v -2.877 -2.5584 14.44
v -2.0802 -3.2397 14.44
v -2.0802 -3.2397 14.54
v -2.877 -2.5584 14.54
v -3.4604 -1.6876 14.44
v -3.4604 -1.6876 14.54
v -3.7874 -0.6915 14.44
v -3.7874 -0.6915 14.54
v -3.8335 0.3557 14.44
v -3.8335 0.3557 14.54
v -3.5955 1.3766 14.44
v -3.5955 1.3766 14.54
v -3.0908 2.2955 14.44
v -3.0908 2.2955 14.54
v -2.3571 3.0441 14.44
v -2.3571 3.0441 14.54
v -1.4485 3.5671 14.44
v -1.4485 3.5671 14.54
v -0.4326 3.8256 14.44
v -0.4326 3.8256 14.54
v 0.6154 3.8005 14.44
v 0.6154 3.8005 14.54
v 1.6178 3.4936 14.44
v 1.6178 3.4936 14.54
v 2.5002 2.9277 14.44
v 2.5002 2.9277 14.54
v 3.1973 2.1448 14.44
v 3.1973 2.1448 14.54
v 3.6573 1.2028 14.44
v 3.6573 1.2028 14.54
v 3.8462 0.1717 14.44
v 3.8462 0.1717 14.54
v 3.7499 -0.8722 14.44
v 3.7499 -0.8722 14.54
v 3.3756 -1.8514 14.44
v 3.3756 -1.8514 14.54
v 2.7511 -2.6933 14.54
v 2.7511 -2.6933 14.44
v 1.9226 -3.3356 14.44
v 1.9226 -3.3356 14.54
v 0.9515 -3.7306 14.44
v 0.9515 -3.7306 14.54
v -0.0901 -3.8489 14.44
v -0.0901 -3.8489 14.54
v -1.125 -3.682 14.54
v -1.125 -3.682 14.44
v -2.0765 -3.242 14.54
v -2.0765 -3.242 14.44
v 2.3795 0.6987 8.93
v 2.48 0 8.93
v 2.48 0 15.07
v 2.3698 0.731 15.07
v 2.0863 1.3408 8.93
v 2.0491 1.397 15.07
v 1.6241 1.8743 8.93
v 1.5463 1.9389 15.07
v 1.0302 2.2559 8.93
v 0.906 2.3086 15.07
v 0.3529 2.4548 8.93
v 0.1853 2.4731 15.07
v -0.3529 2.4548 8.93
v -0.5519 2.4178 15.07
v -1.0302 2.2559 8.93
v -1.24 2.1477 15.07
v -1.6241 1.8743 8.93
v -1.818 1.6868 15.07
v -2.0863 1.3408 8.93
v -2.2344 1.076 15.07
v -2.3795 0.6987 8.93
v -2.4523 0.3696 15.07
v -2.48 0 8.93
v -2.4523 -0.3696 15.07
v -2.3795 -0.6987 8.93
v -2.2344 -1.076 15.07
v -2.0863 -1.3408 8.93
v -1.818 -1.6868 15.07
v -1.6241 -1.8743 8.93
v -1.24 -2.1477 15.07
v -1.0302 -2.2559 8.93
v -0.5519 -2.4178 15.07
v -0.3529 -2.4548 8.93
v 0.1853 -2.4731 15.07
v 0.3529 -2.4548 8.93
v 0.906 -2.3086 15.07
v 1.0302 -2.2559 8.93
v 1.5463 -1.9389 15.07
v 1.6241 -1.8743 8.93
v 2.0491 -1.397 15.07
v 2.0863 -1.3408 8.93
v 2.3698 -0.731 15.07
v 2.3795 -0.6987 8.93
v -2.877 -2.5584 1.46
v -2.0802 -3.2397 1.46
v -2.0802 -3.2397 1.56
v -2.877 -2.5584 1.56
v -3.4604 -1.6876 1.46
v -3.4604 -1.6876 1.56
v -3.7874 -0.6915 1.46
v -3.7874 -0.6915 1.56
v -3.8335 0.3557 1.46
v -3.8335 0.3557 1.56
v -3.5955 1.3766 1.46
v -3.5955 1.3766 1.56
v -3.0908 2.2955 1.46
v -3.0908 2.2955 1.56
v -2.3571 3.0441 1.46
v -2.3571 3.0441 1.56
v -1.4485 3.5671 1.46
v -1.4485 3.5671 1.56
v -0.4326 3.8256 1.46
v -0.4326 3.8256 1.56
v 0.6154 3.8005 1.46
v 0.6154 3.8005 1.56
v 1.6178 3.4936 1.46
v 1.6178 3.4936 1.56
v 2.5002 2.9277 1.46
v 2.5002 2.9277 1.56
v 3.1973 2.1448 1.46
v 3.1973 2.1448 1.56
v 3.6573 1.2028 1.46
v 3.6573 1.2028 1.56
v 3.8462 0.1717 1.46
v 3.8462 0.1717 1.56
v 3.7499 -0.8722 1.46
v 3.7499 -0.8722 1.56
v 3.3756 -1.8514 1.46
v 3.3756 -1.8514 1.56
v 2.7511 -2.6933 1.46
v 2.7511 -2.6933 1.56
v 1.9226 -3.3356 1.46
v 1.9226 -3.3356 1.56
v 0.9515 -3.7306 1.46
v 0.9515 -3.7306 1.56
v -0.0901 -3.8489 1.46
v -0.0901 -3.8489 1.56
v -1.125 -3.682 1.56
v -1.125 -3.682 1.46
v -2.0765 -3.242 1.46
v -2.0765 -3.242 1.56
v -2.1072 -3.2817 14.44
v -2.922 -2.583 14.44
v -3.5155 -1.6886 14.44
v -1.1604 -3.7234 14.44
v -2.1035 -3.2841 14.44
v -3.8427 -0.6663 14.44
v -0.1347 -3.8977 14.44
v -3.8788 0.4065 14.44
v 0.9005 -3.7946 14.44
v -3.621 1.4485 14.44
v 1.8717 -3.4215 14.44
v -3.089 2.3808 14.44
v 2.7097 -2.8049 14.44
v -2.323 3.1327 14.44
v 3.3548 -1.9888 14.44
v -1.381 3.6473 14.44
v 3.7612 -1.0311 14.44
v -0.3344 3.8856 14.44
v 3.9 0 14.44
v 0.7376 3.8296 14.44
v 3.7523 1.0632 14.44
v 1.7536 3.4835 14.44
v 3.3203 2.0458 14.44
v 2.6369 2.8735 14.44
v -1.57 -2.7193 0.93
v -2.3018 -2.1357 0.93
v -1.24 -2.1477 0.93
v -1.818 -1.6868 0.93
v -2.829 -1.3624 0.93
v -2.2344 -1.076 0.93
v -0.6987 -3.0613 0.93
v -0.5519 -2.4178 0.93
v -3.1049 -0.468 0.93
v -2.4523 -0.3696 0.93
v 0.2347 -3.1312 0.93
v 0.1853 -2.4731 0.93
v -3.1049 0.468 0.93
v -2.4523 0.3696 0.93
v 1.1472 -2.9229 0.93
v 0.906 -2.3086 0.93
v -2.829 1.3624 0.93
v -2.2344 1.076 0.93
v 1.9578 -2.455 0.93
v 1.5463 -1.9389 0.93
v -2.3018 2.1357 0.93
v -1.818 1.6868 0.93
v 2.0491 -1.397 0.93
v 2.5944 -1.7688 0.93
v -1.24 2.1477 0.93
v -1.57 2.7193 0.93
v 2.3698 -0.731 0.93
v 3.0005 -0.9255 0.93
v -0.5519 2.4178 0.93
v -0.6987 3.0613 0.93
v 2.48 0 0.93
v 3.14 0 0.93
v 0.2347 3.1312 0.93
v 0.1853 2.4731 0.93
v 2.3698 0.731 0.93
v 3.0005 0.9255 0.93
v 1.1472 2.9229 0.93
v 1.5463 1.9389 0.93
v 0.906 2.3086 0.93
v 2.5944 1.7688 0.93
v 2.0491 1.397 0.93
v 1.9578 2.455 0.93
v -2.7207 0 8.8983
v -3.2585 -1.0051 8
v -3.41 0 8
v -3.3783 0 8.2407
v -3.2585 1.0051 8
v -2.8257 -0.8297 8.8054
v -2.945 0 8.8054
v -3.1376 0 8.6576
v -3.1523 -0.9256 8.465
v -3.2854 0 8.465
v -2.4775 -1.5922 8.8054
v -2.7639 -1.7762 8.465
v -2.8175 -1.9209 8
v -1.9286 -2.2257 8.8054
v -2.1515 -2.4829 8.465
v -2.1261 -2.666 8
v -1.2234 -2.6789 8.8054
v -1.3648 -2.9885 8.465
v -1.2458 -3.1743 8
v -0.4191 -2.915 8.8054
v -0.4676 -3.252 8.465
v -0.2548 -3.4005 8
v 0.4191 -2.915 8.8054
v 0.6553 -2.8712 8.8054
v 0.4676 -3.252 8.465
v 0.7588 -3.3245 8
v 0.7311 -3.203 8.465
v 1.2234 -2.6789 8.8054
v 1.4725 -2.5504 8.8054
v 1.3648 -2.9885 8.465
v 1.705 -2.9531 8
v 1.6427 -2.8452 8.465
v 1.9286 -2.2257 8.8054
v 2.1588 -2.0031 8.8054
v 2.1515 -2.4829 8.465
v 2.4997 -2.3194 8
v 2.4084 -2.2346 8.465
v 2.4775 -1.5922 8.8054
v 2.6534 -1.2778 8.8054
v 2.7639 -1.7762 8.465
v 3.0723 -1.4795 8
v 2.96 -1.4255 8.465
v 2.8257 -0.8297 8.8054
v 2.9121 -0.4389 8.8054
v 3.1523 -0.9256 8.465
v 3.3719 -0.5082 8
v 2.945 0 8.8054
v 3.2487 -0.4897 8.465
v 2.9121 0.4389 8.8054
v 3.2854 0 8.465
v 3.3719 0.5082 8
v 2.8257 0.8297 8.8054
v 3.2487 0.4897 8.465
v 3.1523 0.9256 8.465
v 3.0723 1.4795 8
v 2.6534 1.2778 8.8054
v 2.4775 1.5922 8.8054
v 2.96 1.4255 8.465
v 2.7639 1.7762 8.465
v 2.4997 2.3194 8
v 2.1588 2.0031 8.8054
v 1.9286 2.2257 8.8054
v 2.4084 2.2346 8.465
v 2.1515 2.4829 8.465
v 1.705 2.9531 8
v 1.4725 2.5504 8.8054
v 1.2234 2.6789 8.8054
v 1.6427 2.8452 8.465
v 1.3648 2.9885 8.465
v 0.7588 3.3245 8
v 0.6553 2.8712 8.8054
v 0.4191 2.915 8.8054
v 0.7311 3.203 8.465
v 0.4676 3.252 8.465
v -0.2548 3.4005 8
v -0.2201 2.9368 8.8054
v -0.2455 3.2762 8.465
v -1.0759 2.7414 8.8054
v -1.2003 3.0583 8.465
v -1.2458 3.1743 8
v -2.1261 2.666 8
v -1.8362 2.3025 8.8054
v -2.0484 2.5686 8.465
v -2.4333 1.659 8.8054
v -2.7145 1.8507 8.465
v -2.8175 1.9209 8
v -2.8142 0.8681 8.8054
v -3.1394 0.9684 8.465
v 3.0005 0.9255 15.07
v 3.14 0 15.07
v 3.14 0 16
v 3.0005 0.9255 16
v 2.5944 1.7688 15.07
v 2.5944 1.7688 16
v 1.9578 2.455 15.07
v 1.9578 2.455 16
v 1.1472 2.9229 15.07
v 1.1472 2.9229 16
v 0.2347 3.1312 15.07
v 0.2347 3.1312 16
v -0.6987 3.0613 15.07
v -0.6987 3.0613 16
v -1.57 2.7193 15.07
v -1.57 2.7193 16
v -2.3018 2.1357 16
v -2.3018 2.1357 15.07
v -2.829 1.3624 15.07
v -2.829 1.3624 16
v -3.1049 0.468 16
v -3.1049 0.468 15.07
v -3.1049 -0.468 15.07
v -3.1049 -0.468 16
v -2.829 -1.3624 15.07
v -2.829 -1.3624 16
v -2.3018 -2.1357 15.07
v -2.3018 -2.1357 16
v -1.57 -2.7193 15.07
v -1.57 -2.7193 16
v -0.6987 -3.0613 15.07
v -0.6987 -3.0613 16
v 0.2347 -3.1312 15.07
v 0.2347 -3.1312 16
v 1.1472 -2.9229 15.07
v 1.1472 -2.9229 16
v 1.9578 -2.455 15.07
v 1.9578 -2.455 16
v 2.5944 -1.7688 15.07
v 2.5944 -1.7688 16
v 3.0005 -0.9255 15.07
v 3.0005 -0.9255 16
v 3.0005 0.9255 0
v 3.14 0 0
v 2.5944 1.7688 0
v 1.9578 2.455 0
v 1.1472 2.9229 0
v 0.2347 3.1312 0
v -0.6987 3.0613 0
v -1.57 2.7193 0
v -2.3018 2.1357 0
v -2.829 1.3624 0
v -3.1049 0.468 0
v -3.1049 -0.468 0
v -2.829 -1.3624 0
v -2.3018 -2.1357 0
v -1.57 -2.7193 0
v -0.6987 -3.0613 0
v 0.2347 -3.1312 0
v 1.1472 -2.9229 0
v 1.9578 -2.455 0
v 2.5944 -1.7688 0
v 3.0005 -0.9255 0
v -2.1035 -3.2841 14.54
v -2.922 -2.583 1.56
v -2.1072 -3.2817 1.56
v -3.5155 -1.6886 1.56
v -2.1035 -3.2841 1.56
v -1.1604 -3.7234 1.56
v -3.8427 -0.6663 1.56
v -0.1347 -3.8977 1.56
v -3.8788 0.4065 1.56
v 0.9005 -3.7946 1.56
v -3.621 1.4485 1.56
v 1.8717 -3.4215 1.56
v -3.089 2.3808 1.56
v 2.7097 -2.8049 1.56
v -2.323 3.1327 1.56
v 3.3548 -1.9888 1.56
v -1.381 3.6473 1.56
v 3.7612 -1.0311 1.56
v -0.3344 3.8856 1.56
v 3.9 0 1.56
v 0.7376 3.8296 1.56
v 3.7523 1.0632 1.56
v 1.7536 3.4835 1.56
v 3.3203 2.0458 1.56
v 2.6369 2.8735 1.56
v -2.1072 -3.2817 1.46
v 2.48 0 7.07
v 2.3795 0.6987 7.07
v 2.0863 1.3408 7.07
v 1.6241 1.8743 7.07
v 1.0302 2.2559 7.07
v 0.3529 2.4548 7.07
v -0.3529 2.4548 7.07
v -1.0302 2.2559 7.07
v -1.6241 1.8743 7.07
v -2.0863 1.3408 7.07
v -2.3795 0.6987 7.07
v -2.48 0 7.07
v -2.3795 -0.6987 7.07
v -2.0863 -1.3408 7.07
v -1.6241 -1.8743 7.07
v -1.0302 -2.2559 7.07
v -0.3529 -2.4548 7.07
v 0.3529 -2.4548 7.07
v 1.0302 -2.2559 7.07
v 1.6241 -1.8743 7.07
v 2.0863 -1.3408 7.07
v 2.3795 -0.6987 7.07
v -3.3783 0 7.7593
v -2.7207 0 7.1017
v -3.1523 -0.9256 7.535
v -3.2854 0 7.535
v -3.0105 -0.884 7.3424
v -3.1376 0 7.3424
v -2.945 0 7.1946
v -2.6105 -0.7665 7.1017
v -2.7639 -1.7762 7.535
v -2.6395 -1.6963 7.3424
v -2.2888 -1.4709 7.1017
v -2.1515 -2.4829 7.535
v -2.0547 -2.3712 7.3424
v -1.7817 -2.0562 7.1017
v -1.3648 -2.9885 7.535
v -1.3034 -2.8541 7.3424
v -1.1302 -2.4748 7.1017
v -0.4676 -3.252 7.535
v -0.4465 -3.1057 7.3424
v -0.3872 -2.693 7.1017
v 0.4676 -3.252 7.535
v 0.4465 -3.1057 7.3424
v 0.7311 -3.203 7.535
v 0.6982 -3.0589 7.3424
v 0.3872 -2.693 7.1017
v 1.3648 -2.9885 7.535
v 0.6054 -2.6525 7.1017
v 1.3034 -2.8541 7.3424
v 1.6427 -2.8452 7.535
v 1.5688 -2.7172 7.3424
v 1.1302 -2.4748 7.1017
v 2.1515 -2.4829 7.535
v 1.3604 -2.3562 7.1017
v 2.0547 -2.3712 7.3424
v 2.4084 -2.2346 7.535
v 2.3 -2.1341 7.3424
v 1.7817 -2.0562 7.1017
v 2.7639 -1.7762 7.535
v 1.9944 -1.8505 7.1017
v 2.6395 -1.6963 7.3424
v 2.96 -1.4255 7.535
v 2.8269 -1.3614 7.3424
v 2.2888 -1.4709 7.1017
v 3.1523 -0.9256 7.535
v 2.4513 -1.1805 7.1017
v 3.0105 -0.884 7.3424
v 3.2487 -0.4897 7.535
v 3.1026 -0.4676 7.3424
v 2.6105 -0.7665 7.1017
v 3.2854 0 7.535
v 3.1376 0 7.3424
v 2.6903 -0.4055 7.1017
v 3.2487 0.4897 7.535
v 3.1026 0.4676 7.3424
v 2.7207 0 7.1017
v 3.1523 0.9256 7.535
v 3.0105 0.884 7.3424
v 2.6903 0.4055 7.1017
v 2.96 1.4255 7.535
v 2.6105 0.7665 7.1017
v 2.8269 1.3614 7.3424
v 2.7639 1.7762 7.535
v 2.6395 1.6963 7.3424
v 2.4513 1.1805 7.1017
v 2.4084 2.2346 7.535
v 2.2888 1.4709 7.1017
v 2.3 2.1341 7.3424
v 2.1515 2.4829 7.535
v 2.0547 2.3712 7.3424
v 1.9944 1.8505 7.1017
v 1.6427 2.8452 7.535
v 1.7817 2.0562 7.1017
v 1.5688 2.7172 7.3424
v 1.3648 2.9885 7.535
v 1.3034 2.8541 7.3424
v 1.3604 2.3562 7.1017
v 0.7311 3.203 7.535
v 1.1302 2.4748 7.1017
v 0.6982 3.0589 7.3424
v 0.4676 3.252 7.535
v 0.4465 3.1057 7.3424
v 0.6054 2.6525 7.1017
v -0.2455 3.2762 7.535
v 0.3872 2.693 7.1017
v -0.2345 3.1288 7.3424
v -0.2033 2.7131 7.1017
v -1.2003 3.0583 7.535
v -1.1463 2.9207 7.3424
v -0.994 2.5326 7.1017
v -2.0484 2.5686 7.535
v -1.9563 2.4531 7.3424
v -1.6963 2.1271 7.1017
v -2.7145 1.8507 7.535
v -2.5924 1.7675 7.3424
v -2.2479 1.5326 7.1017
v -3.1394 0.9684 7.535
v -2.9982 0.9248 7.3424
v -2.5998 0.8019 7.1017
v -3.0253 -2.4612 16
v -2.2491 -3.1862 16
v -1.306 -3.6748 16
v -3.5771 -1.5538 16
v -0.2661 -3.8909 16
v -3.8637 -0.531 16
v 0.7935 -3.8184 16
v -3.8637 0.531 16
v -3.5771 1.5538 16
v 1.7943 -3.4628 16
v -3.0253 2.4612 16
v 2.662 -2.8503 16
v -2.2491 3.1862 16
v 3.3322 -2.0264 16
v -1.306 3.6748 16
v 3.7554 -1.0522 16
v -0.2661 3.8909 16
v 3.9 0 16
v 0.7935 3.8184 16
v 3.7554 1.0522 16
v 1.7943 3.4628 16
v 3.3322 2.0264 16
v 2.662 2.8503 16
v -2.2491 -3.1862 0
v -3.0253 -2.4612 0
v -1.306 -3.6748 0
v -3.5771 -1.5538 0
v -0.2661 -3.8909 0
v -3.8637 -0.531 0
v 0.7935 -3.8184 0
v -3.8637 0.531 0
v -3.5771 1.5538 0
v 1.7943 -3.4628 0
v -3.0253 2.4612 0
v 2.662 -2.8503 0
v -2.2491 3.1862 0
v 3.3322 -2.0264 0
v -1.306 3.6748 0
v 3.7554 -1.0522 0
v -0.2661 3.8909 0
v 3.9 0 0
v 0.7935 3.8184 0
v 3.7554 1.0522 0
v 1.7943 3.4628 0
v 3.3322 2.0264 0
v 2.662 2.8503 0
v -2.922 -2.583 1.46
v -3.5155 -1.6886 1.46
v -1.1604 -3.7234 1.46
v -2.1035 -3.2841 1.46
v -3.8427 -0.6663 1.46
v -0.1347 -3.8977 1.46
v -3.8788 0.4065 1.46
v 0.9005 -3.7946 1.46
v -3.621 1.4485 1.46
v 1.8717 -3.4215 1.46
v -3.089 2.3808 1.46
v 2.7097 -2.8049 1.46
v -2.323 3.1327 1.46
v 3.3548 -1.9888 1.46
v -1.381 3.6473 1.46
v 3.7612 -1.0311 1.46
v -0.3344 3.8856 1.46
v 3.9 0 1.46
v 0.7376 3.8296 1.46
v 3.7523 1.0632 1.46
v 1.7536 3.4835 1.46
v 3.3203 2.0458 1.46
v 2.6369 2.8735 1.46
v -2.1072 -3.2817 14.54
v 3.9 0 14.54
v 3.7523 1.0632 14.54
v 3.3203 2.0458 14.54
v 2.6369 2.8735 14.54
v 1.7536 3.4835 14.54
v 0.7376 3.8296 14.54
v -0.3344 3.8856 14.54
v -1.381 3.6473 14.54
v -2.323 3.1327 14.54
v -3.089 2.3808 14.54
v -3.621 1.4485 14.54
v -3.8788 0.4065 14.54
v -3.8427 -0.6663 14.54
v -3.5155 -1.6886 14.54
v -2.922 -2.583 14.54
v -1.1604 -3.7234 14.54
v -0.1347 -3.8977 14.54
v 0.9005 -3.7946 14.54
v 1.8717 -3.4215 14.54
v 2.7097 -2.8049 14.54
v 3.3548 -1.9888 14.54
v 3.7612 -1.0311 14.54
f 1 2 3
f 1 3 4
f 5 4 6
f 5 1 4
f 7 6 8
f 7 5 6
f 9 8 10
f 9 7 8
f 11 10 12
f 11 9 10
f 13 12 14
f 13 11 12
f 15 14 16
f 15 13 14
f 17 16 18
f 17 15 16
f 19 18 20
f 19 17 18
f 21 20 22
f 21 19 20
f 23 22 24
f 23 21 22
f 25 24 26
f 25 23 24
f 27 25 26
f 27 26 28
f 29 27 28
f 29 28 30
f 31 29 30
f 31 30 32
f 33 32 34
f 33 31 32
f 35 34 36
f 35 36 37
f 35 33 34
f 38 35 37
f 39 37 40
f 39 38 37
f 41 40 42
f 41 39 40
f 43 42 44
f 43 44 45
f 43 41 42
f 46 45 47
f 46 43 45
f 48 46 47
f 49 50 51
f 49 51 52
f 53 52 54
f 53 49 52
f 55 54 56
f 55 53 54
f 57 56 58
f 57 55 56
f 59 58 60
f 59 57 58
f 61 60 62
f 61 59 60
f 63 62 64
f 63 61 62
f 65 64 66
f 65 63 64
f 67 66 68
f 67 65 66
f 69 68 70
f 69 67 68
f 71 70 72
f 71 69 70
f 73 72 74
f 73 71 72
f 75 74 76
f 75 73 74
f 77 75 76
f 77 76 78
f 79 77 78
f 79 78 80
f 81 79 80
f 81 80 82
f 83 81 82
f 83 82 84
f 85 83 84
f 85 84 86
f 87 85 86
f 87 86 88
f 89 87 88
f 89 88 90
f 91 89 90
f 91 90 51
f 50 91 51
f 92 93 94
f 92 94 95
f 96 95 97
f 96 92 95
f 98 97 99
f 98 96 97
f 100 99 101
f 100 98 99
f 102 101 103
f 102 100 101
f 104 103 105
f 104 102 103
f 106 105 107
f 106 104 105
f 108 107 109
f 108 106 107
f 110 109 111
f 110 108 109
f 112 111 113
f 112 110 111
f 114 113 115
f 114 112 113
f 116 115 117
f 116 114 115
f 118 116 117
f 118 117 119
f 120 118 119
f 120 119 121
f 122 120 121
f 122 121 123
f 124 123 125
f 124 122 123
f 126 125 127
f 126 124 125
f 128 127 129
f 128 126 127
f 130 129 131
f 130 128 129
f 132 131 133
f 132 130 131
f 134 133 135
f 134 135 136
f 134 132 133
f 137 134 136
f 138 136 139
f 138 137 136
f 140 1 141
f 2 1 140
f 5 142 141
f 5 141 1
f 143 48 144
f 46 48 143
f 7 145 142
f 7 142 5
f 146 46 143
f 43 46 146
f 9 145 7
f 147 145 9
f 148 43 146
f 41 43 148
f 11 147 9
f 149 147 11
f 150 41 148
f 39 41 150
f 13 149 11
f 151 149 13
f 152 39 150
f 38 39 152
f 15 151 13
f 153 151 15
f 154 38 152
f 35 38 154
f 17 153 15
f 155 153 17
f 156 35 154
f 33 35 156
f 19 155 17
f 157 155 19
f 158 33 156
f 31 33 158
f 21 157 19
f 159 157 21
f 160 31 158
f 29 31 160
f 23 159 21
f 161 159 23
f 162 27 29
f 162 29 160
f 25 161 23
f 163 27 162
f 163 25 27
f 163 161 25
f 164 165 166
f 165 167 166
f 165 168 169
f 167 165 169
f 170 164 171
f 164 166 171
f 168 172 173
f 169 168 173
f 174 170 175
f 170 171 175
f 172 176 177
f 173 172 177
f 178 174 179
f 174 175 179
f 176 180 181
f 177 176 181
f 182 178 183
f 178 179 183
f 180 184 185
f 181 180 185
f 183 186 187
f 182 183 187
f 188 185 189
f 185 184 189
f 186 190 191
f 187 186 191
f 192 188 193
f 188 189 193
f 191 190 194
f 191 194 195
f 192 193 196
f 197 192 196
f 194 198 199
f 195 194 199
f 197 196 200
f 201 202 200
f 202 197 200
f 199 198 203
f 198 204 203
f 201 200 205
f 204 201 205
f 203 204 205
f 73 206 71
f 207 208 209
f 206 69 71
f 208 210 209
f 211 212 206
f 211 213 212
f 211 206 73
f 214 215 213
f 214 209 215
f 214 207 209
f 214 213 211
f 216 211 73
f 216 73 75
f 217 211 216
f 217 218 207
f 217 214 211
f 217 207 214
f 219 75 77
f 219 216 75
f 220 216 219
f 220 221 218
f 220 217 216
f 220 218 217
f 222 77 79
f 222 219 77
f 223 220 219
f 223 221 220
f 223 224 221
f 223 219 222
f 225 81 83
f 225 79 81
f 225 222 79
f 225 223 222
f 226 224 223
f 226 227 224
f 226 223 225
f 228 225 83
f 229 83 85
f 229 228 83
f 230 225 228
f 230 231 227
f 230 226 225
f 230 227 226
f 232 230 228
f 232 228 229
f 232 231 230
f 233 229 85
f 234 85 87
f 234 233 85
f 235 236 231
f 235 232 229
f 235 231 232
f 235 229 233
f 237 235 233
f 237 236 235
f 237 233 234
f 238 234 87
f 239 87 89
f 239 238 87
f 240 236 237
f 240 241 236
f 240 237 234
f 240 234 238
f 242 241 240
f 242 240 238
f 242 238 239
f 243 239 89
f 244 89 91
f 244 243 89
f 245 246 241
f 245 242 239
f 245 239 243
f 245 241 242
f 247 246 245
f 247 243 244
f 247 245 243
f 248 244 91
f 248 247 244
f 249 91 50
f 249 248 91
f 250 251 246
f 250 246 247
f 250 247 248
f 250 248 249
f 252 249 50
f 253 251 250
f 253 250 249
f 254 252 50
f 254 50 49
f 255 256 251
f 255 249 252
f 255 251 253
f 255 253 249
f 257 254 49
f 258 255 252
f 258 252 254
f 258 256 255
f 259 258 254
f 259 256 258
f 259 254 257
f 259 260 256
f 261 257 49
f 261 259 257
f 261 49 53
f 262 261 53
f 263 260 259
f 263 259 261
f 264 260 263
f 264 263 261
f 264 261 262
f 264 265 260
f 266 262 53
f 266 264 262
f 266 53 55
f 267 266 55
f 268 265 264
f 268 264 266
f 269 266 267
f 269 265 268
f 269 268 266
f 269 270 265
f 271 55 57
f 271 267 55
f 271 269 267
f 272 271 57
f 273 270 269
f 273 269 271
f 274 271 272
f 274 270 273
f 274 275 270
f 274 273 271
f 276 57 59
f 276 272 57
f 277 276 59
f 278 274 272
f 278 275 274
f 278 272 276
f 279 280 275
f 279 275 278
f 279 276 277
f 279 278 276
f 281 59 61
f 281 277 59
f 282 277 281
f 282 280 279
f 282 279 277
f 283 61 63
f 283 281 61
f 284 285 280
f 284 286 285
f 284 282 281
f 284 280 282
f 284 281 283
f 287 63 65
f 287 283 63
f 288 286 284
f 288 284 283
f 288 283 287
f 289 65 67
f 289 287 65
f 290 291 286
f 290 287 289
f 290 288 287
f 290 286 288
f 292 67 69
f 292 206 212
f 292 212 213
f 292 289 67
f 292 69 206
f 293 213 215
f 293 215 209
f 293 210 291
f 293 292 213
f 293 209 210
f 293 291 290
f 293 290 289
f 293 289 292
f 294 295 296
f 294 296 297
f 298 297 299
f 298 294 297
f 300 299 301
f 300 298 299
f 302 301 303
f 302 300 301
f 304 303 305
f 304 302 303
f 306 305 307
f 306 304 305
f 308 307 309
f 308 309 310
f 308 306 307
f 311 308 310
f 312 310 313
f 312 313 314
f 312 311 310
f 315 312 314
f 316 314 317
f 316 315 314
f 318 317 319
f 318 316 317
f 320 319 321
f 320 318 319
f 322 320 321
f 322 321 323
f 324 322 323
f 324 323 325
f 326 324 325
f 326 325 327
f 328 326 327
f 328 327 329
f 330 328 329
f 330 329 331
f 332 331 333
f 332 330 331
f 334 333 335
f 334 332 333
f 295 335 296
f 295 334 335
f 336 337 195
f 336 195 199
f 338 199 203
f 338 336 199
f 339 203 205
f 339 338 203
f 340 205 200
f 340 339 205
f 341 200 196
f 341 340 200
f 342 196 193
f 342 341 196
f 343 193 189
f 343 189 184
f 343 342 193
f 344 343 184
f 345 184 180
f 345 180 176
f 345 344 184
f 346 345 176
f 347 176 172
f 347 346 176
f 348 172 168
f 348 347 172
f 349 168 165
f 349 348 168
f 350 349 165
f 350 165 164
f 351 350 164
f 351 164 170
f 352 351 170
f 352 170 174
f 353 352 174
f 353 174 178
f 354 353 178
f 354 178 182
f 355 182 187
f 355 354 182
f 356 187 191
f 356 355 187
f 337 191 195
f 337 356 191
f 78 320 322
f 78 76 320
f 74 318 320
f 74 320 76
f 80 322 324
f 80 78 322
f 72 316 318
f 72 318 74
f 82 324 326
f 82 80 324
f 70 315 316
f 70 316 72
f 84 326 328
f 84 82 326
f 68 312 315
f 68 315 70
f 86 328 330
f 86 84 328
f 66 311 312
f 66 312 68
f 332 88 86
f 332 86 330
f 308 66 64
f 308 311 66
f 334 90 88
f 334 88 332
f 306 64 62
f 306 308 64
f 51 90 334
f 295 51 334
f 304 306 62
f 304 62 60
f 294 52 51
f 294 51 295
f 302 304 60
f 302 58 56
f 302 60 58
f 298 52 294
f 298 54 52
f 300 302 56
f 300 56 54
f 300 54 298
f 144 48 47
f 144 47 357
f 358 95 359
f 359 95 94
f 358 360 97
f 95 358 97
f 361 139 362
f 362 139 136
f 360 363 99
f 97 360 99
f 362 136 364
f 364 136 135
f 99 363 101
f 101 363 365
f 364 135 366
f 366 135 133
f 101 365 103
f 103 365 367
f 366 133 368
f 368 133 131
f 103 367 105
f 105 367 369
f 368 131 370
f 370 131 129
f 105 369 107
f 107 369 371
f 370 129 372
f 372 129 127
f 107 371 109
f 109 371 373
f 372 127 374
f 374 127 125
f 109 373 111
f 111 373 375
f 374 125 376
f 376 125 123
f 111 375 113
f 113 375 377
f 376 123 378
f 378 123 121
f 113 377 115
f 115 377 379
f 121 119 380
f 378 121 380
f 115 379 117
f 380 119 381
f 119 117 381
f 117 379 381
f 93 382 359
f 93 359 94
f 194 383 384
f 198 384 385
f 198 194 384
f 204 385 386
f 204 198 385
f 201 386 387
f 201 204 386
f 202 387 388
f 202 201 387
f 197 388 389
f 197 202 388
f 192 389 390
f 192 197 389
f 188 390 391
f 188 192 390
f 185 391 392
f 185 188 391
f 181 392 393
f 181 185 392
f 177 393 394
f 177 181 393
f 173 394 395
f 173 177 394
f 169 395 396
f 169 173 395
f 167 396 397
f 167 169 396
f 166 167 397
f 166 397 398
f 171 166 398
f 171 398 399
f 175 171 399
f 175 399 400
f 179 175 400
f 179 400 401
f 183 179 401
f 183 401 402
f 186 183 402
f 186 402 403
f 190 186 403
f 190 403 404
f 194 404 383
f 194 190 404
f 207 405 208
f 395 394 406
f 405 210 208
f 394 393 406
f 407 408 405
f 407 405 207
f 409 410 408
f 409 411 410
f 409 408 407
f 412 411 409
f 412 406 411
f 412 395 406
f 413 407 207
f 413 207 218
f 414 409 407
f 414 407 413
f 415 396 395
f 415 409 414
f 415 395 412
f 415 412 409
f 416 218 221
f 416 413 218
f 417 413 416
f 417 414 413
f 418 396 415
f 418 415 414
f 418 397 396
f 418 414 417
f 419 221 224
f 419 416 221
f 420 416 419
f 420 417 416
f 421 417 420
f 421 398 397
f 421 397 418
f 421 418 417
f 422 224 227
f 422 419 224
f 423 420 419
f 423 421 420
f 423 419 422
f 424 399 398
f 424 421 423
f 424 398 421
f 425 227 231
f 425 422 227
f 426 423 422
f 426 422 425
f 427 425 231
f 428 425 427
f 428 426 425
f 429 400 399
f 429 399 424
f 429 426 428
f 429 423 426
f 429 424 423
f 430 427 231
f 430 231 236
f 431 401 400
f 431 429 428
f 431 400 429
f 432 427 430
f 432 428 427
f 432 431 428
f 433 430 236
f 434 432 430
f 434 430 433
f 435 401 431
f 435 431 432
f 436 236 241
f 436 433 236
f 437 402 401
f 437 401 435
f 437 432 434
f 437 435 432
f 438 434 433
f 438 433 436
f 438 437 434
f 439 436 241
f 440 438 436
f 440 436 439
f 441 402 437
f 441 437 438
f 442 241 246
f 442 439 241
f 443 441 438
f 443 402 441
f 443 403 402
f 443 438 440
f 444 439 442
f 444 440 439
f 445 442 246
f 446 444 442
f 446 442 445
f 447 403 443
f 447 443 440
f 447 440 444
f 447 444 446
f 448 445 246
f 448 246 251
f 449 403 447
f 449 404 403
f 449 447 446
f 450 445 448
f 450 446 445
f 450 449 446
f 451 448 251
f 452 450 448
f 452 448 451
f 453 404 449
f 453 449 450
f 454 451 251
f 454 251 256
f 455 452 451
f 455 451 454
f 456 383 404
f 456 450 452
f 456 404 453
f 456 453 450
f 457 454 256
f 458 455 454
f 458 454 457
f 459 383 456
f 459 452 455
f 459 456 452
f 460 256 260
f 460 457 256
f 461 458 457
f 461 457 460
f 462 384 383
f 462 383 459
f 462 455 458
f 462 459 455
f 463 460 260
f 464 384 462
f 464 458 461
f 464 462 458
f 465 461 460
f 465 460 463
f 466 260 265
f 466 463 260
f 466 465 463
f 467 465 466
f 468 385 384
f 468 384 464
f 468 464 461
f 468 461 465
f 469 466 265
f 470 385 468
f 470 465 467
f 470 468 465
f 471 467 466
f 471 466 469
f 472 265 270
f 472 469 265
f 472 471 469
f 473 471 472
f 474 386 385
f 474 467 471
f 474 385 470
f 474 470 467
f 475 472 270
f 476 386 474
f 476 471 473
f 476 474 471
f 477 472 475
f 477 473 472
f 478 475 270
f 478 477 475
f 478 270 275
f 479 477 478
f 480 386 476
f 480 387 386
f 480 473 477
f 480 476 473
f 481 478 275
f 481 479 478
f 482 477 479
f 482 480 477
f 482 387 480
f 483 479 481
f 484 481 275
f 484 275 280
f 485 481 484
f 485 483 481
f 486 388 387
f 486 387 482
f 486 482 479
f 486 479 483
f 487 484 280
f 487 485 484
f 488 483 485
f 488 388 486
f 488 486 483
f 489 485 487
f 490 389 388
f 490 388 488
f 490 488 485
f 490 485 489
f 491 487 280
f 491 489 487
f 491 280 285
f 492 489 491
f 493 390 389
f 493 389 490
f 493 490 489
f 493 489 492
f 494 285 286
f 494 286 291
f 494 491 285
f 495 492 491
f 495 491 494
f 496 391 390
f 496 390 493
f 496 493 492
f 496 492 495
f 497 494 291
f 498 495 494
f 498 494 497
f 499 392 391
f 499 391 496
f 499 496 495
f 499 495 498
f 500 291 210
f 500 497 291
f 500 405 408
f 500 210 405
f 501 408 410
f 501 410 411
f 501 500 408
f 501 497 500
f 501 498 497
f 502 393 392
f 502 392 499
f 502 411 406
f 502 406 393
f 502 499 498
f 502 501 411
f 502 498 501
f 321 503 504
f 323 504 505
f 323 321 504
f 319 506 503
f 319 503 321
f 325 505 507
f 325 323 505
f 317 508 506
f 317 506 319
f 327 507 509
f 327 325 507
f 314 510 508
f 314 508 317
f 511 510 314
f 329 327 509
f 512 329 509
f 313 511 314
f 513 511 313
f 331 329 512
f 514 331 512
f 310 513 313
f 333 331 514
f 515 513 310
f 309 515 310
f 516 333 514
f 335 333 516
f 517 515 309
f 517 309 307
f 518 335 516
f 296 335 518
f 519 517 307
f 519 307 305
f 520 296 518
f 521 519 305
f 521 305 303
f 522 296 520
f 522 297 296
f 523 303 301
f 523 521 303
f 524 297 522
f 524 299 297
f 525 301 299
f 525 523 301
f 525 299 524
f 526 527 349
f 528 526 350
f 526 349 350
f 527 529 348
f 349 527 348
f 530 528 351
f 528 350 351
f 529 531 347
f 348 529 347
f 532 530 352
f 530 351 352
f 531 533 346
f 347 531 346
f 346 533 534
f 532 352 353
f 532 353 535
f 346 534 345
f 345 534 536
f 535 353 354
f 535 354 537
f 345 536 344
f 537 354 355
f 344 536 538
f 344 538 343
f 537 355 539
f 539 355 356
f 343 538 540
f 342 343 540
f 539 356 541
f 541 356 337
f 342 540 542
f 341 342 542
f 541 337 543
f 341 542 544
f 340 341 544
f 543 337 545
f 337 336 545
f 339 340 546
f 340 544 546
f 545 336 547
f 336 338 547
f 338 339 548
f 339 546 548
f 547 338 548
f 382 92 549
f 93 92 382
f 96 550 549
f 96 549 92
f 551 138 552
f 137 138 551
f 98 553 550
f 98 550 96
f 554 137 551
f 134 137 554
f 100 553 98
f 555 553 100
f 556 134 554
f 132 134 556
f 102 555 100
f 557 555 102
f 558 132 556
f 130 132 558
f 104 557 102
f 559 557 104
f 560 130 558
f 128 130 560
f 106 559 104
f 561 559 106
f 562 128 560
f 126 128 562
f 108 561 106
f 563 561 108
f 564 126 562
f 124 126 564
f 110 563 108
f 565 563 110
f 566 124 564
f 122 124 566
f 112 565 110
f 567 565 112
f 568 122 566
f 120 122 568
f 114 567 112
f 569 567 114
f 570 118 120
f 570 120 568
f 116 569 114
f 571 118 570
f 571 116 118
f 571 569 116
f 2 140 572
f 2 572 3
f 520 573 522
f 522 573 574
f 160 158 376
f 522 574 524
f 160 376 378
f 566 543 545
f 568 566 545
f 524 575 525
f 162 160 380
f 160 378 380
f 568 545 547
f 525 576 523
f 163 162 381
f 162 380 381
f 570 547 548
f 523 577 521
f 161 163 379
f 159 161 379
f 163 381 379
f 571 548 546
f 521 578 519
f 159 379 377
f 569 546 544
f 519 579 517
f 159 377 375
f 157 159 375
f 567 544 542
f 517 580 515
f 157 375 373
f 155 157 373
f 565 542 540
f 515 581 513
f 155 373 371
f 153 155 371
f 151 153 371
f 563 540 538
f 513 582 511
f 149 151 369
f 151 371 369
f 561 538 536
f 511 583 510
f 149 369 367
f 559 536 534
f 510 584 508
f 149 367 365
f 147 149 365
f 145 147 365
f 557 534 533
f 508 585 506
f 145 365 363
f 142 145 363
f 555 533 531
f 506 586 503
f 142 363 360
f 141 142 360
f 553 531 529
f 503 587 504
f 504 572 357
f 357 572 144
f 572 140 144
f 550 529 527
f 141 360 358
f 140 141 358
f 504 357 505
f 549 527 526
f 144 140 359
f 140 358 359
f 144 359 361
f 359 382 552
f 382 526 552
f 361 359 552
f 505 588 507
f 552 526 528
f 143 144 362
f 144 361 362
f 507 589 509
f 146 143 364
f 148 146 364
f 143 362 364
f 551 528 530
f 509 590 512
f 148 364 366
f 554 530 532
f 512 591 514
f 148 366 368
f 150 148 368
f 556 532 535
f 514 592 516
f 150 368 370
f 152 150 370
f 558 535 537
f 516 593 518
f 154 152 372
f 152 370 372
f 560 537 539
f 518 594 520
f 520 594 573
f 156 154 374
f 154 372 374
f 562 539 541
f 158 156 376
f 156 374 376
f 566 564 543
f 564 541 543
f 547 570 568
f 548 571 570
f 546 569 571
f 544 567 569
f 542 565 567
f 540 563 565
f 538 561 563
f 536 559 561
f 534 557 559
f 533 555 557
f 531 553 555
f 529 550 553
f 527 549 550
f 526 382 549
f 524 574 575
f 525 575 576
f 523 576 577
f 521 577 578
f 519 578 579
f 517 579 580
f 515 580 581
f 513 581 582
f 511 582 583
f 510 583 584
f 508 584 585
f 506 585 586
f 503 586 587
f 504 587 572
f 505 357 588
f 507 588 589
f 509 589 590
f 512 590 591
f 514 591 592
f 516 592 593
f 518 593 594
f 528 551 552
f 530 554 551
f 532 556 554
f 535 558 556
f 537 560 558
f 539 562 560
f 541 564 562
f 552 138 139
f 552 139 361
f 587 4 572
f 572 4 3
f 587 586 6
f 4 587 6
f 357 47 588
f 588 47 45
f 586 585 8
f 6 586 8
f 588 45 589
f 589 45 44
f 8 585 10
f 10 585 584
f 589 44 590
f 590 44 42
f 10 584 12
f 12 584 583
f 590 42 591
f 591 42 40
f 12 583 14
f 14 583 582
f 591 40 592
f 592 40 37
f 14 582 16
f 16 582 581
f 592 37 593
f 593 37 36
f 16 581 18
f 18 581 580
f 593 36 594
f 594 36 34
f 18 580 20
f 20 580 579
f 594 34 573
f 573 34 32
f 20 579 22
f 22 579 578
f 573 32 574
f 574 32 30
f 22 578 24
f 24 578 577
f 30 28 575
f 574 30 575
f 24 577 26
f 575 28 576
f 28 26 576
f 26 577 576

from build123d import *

# Parameters (mm, degrees)
SKETCH1_R           = 3.9
SKETCH1_R_2         = 2.48
BOSS_EXTRUDE1_DEPTH = 16
CUT_EXTRUDE1_START  = -0.93
SKETCH2_R           = 3.14
SKETCH2_R_2         = 2.48
CUT_EXTRUDE1_DEPTH  = 0.93
SKETCH3_R           = 3.14
SKETCH3_R_2         = 2.48
CUT_EXTRUDE3_DEPTH  = 0.93
SKETCH4_R           = 0.93
WRAP1_START         = 1.46
WRAP1_DEPTH         = 0.1
WRAP1_START_2       = 14.44
WRAP1_2_DEPTH       = 0.1


# Read off the part's stored shape, not the designer's step: Wrap1
with BuildPart() as part:
    # Sketch1 → Boss-Extrude1 (new body)
    with BuildSketch(Plane.XY):
        Circle(SKETCH1_R)
        Circle(SKETCH1_R_2, mode=Mode.SUBTRACT)
    extrude(amount=BOSS_EXTRUDE1_DEPTH)

    # Sketch2 → Cut-Extrude1 (cut)
    with BuildSketch(Plane.XY.offset(16).offset(CUT_EXTRUDE1_START)):
        Circle(SKETCH2_R)
        Circle(SKETCH2_R_2, mode=Mode.SUBTRACT)
    extrude(amount=CUT_EXTRUDE1_DEPTH, mode=Mode.SUBTRACT)

    # Sketch3 → Cut-Extrude3 (cut)
    with BuildSketch(Plane.XY):
        Circle(SKETCH3_R)
        Circle(SKETCH3_R_2, mode=Mode.SUBTRACT)
    extrude(amount=CUT_EXTRUDE3_DEPTH, mode=Mode.SUBTRACT)

    # Sketch4 → Cut-Revolve1 (revolve, cut)
    with BuildSketch(Plane(origin=(0, 0, 0), x_dir=(1, 0, 0), z_dir=(0, 1, 0)), mode=Mode.PRIVATE) as cut_revolve1_sk:
        with Locations((2.48, -8)):
            Circle(SKETCH4_R)
    revolve(cut_revolve1_sk.sketch.rotate(Axis((0, 0, 0.93), (0, 0, 1)), 180), axis=Axis((0, 0, 0.93), (0, 0, 1)), mode=Mode.SUBTRACT)

    # Wrap1 outline → Wrap1 (cut)
    with BuildSketch(Plane.XY.offset(WRAP1_START)):
        with BuildLine():
            Line((-2.107178993, -3.281736841), (-2.080163878, -3.239663292))
            ThreePointArc((-2.080163878, -3.239663292), (2.078325496, 3.240842967), (-2.076488681, -3.242020166))
            Line((-2.076488681, -3.242020166), (-2.103456067, -3.284124324))
            ThreePointArc((-2.103456067, -3.284124324), (2.105317868, 3.28293111), (-2.107178993, -3.281736841))
        make_face()
    extrude(amount=WRAP1_DEPTH, mode=Mode.SUBTRACT)

    # Wrap1 2 outline → Wrap1 2 (cut)
    with BuildSketch(Plane.XY.offset(WRAP1_START_2)):
        with BuildLine():
            Line((-2.107178993, -3.281736841), (-2.080163878, -3.239663292))
            ThreePointArc((-2.080163878, -3.239663292), (2.078325496, 3.240842967), (-2.076488681, -3.242020166))
            Line((-2.076488681, -3.242020166), (-2.103456067, -3.284124324))
            ThreePointArc((-2.103456067, -3.284124324), (2.105317868, 3.28293111), (-2.107178993, -3.281736841))
        make_face()
    extrude(amount=WRAP1_2_DEPTH, mode=Mode.SUBTRACT)


solid = part.part
